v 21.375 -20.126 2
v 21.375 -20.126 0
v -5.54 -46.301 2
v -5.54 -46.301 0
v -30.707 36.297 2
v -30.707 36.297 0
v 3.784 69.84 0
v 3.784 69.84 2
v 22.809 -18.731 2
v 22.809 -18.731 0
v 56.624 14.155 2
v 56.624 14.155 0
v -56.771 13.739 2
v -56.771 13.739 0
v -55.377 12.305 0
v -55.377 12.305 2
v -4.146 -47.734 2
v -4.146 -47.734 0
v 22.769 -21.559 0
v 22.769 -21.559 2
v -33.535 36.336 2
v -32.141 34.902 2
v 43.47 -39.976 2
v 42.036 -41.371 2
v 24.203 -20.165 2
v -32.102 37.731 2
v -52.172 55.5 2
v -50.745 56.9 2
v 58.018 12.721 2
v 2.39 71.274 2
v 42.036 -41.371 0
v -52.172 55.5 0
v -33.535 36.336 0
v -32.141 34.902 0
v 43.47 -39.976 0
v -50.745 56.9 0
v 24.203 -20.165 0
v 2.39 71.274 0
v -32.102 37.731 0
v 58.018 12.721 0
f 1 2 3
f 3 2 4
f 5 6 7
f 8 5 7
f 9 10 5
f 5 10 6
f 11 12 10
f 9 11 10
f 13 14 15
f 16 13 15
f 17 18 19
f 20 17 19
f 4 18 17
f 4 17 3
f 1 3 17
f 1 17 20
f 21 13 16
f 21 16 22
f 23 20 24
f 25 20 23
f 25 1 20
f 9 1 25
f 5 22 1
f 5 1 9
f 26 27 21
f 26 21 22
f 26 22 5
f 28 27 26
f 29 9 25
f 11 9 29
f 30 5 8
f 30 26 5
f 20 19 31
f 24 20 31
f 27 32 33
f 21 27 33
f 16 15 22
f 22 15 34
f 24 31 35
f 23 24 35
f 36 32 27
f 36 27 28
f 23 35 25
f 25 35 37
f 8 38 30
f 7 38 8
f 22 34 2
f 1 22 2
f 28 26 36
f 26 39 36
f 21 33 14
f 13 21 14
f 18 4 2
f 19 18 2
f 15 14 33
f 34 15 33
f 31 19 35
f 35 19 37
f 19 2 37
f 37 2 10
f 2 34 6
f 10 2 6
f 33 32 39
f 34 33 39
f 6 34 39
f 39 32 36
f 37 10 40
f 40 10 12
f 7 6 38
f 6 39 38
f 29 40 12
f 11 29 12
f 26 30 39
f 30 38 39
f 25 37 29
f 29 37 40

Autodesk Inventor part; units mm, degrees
ref_plane "YZ Plane" through (0, 0, 0) normal (1, 0, 0) x (0, 1, 0)
ref_plane "XZ Plane" through (0, 0, 0) normal (0, 1, 0) x (-1, 0, 0)
ref_plane "XY Plane" through (0, 0, 0) normal (0, 0, 1) x (1, 0, 0)
sketch "Sketch1" plane through (0, 0, 0) normal (0, 0, 1) x (1, 0, 0)
  arc A0 (5.5811, -56.8606) -> (20.209, -64.6836) centre (38.8796, -12.1848) ccw construction
  arc A1 (-7.6539, -43.4667) -> (5.5811, -56.8606) centre (37.8873, -11.7018) ccw construction
  arc A2 (-7.6539, -43.4667) -> (-31.2183, -12.0793) centre (-386.265, -303.1724) ccw construction
  arc A3 (-31.2183, -12.0793) -> (-63.3277, 19.0744) centre (-191.6112, -145.2692) ccw construction
  arc A4 (-67.5206, 26.3221) -> (-63.3277, 19.0744) centre (-54.6162, 28.9507) ccw construction
  arc A5 (-66.9469, 41.0059) -> (-67.5206, 26.3221) centre (-15.6776, 31.6496) ccw construction
  line L0 (-66.9469, 41.0059) -> (-26.0985, 81.0785) construction
  arc A6 (-3.6955, 79.7027) -> (-26.0985, 81.0785) centre (-17.6076, 36.2535) ccw construction
  arc A7 (1.4491, 74.6716) -> (-3.6955, 79.7027) centre (-6.1453, 72.0517) ccw construction
  arc A8 (2.6831, 69.1533) -> (1.4491, 74.6716) centre (-18.5892, 67.2935) ccw construction
  arc A9 (2.6831, 69.1533) -> (3.1898, 63.5624) centre (229.5421, 86.8959) ccw construction
  arc A10 (3.1898, 63.5624) -> (8.7161, 49.818) centre (30.4167, 66.5265) ccw construction
  arc A11 (8.7161, 49.818) -> (19.0471, 39.3259) centre (47.1297, 77.3097) ccw construction
  arc A12 (19.0471, 39.3259) -> (32.6891, 29.8296) centre (104.4845, 147.5139) ccw construction
  arc A13 (32.6891, 29.8296) -> (50.5655, 19.6706) centre (502.3948, 835.5524) ccw construction
  arc A14 (57.8671, 12.5741) -> (50.5655, 19.6706) centre (33.0101, -5.6965) ccw construction
  arc A15 (67.0572, -4.125) -> (57.8671, 12.5741) centre (18.4686, -19.9867) ccw construction
  arc A16 (68.9532, -23.0115) -> (67.0572, -4.125) centre (24.8632, -17.8992) ccw construction
  line L1 (-52.1723, 55.4999) -> (42.0363, -41.3708)
  line L2 (43.4701, -39.9764) -> (-50.7446, 56.9005)
  line L3 (42.0363, -41.3708) -> (43.4701, -39.9764)
  line L4 (-4.1456, -47.7345) -> (58.0182, 12.7211)
  line L5 (56.6239, 14.1548) -> (-5.54, -46.3007)
  line L6 (-55.3767, 12.3052) -> (3.7843, 69.8404)
  line L7 (2.3899, 71.2742) -> (-56.7711, 13.739)
  line L8 (-56.7711, 13.739) -> (-55.3767, 12.3052)
  line L9 (2.3899, 71.2742) -> (3.7843, 69.8404)
  line L10 (-52.1723, 55.4999) -> (-50.7446, 56.9005)
  line L11 (-4.1456, -47.7345) -> (-5.54, -46.3007)
  line L12 (58.0182, 12.7211) -> (56.6239, 14.1548)
  point P0 (0, 0)
  point P1 (-8.2693, 4.2237)
  point P2 (-4.9861, 4.7501)
  point P3 (-66.0155, 22.3561)
  point P4 (24.203, -20.1649)
  point P5 (22.8086, -18.7311)
  point P6 (-30.7071, 36.2969)
  point P7 (-32.1015, 37.7306)
  point P8 (-33.5353, 36.3363)
  point P9 (-32.1409, 34.9025)
  point P10 (21.3749, -20.1255)
  point P11 (22.7692, -21.5593)
  dimension "d243" = 2
  dimension "d244" = 2
  dimension "d245" = 2
extrude "Extrusion12" add sketch "Sketch1" along normal blind 2
properties part number "print008_Grundform_innen_neu"
